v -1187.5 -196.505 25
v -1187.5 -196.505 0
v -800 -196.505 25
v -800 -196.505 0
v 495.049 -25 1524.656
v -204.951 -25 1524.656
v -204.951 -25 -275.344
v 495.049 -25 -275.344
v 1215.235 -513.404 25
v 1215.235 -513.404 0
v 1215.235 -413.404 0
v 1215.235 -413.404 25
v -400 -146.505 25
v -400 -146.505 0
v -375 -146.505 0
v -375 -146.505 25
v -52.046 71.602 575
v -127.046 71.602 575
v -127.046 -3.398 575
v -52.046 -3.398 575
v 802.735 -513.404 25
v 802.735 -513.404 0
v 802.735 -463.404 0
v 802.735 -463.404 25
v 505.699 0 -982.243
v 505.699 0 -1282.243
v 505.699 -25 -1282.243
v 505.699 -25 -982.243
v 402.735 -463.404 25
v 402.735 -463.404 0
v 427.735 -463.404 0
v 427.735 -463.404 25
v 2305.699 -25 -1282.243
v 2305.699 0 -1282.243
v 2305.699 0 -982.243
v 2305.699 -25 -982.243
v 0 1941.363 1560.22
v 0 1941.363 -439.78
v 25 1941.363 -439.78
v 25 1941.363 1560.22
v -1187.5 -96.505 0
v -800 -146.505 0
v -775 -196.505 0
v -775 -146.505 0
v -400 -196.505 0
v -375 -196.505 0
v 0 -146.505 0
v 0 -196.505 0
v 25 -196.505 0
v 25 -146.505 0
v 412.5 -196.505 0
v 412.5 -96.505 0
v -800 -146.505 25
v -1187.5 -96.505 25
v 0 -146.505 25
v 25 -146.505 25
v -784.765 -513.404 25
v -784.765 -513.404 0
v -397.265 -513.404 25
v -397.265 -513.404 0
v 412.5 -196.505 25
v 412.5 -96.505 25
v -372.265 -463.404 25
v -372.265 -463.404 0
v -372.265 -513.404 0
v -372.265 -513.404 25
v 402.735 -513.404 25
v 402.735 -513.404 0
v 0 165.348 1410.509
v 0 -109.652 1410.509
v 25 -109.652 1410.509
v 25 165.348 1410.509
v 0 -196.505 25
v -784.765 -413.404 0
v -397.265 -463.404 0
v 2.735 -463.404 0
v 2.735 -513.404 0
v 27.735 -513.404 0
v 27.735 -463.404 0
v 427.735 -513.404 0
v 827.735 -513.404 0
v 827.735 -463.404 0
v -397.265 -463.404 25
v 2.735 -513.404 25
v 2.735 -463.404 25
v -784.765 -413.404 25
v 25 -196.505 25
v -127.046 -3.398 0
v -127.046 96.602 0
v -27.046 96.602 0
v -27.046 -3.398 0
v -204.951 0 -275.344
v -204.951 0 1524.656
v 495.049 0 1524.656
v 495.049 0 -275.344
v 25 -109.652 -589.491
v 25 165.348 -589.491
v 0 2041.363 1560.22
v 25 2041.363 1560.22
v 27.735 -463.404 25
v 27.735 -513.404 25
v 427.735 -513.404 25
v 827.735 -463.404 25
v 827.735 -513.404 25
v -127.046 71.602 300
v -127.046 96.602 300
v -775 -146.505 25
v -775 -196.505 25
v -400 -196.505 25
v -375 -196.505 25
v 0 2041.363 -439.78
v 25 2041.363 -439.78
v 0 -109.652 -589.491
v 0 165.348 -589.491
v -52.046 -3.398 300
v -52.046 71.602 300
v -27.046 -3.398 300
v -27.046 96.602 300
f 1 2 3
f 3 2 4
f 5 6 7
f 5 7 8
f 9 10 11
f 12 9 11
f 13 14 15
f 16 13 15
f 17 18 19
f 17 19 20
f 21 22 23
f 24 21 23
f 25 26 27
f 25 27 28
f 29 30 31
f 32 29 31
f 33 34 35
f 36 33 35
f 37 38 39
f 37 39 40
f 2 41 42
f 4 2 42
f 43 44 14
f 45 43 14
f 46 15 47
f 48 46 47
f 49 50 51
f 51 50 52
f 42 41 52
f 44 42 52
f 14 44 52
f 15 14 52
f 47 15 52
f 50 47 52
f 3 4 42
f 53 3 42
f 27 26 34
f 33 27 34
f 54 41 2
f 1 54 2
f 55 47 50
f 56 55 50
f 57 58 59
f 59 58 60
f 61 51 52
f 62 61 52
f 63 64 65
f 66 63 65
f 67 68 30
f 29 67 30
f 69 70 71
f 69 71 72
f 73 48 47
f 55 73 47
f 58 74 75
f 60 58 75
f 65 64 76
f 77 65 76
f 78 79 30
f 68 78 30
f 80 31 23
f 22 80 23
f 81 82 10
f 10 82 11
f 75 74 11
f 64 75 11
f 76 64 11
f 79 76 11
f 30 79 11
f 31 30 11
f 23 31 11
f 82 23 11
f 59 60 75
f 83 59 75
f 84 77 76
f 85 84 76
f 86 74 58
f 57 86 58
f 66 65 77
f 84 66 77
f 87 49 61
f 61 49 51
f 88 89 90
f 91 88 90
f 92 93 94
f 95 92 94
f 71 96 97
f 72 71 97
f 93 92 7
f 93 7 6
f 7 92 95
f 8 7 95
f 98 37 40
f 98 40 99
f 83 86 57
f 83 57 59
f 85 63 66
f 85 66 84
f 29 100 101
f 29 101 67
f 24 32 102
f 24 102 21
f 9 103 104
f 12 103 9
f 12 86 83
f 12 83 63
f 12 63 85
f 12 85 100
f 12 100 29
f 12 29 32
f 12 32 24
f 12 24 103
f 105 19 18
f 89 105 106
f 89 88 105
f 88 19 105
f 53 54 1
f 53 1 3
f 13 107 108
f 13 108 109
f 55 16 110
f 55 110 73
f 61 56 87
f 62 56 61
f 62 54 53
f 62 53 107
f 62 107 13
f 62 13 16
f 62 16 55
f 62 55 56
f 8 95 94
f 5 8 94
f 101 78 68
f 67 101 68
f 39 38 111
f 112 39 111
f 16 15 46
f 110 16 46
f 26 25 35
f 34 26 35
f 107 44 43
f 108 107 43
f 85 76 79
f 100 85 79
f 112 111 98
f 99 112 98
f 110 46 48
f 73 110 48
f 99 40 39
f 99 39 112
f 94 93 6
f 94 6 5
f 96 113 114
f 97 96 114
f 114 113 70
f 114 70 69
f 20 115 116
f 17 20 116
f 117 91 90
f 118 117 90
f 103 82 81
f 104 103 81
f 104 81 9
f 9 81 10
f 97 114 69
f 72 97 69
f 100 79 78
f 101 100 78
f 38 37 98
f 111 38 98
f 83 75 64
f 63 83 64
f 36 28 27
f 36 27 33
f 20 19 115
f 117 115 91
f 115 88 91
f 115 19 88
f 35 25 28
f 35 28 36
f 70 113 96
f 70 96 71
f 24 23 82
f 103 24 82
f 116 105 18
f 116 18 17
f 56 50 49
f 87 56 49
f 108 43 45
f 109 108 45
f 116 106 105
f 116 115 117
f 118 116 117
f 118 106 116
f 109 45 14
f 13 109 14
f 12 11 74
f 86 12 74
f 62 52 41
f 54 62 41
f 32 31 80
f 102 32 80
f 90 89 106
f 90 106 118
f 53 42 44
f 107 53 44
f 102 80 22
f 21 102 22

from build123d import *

# Parameters (mm, degrees)
F0_W      = 100
F0_H      = 100
F1_DEPTH  = 300
F2_W      = 75
F2_H      = 75
F3_DEPTH  = 275
F4_W      = 700
F4_H      = 1800
F5_DEPTH  = 25
F6_W      = 275
F6_H      = 2000
F7_DEPTH  = 25
F8_W      = 1800
F8_H      = 300
F9_DEPTH  = 25
F10_W     = 100
F10_H     = 2000
F11_DEPTH = 25
F13_DEPTH = 25
F15_DEPTH = 25


with BuildPart() as f1:
    # F0 (on Top) → F1 (new body)
    with BuildSketch(Plane.XY):
        with Locations((-77.045622, 46.602286)):
            Rectangle(F0_W, F0_H)
    extrude(amount=F1_DEPTH)

    # F2 (on face) → F3 (join)
    with BuildSketch(Plane.XY.offset(300)):
        with Locations((-89.545622, 34.102286)):
            Rectangle(F2_W, F2_H)
    extrude(amount=F3_DEPTH)


with BuildPart() as f5:
    # F4 (on Front) → F5 (new body)
    with BuildSketch(Plane.XZ):
        with Locations((145.048743, 624.656105)):
            Rectangle(F4_W, F4_H)
    extrude(amount=F5_DEPTH)


with BuildPart() as f7:
    # F6 (on Right) → F7 (new body)
    with BuildSketch(Plane.YZ):
        with Locations((27.847838, 410.509288)):
            Rectangle(F6_W, F6_H)
    extrude(amount=F7_DEPTH)


with BuildPart() as f9:
    # F8 (on Front) → F9 (new body)
    with BuildSketch(Plane.XZ):
        with Locations((1405.699396, -1132.243133)):
            Rectangle(F8_W, F8_H)
    extrude(amount=F9_DEPTH)


with BuildPart() as f11:
    # F10 (on Right) → F11 (new body)
    with BuildSketch(Plane.YZ):
        with Locations((1991.363335, 560.219765)):
            Rectangle(F10_W, F10_H)
    extrude(amount=F11_DEPTH)


with BuildPart() as f13:
    # F12 (on Top) → F13 (new body)
    with BuildSketch(Plane.XY):
        Polygon((25, -196.505308), (412.5, -196.505308), (412.5, -96.505308), (-1187.5, -96.505308), (-1187.5, -196.505308), (-800, -196.505308), (-800, -146.505308), (-775, -146.505308), (-775, -196.505308), (-400, -196.505308), (-400, -146.505308), (-375, -146.505308), (-375, -196.505308), (0, -196.505308), (0, -146.505308), (25, -146.505308), align=None)
    extrude(amount=F13_DEPTH)


with BuildPart() as f15:
    # F14 (on Top) → F15 (new body)
    with BuildSketch(Plane.XY):
        Polygon((827.735174, -513.403773), (1215.235174, -513.403773), (1215.235174, -413.403773), (-784.764826, -413.403773), (-784.764826, -513.403773), (-397.264826, -513.403773), (-397.264826, -463.403773), (-372.264826, -463.403773), (-372.264826, -513.403773), (2.735174, -513.403773), (2.735174, -463.403773), (27.735174, -463.403773), (27.735174, -513.403773), (402.735174, -513.403773), (402.735174, -463.403773), (427.735174, -463.403773), (427.735174, -513.403773), (802.735174, -513.403773), (802.735174, -463.403773), (827.735174, -463.403773), align=None)
    extrude(amount=F15_DEPTH)


solid = Compound([f1.part, f5.part, f7.part, f9.part, f11.part, f13.part, f15.part])
